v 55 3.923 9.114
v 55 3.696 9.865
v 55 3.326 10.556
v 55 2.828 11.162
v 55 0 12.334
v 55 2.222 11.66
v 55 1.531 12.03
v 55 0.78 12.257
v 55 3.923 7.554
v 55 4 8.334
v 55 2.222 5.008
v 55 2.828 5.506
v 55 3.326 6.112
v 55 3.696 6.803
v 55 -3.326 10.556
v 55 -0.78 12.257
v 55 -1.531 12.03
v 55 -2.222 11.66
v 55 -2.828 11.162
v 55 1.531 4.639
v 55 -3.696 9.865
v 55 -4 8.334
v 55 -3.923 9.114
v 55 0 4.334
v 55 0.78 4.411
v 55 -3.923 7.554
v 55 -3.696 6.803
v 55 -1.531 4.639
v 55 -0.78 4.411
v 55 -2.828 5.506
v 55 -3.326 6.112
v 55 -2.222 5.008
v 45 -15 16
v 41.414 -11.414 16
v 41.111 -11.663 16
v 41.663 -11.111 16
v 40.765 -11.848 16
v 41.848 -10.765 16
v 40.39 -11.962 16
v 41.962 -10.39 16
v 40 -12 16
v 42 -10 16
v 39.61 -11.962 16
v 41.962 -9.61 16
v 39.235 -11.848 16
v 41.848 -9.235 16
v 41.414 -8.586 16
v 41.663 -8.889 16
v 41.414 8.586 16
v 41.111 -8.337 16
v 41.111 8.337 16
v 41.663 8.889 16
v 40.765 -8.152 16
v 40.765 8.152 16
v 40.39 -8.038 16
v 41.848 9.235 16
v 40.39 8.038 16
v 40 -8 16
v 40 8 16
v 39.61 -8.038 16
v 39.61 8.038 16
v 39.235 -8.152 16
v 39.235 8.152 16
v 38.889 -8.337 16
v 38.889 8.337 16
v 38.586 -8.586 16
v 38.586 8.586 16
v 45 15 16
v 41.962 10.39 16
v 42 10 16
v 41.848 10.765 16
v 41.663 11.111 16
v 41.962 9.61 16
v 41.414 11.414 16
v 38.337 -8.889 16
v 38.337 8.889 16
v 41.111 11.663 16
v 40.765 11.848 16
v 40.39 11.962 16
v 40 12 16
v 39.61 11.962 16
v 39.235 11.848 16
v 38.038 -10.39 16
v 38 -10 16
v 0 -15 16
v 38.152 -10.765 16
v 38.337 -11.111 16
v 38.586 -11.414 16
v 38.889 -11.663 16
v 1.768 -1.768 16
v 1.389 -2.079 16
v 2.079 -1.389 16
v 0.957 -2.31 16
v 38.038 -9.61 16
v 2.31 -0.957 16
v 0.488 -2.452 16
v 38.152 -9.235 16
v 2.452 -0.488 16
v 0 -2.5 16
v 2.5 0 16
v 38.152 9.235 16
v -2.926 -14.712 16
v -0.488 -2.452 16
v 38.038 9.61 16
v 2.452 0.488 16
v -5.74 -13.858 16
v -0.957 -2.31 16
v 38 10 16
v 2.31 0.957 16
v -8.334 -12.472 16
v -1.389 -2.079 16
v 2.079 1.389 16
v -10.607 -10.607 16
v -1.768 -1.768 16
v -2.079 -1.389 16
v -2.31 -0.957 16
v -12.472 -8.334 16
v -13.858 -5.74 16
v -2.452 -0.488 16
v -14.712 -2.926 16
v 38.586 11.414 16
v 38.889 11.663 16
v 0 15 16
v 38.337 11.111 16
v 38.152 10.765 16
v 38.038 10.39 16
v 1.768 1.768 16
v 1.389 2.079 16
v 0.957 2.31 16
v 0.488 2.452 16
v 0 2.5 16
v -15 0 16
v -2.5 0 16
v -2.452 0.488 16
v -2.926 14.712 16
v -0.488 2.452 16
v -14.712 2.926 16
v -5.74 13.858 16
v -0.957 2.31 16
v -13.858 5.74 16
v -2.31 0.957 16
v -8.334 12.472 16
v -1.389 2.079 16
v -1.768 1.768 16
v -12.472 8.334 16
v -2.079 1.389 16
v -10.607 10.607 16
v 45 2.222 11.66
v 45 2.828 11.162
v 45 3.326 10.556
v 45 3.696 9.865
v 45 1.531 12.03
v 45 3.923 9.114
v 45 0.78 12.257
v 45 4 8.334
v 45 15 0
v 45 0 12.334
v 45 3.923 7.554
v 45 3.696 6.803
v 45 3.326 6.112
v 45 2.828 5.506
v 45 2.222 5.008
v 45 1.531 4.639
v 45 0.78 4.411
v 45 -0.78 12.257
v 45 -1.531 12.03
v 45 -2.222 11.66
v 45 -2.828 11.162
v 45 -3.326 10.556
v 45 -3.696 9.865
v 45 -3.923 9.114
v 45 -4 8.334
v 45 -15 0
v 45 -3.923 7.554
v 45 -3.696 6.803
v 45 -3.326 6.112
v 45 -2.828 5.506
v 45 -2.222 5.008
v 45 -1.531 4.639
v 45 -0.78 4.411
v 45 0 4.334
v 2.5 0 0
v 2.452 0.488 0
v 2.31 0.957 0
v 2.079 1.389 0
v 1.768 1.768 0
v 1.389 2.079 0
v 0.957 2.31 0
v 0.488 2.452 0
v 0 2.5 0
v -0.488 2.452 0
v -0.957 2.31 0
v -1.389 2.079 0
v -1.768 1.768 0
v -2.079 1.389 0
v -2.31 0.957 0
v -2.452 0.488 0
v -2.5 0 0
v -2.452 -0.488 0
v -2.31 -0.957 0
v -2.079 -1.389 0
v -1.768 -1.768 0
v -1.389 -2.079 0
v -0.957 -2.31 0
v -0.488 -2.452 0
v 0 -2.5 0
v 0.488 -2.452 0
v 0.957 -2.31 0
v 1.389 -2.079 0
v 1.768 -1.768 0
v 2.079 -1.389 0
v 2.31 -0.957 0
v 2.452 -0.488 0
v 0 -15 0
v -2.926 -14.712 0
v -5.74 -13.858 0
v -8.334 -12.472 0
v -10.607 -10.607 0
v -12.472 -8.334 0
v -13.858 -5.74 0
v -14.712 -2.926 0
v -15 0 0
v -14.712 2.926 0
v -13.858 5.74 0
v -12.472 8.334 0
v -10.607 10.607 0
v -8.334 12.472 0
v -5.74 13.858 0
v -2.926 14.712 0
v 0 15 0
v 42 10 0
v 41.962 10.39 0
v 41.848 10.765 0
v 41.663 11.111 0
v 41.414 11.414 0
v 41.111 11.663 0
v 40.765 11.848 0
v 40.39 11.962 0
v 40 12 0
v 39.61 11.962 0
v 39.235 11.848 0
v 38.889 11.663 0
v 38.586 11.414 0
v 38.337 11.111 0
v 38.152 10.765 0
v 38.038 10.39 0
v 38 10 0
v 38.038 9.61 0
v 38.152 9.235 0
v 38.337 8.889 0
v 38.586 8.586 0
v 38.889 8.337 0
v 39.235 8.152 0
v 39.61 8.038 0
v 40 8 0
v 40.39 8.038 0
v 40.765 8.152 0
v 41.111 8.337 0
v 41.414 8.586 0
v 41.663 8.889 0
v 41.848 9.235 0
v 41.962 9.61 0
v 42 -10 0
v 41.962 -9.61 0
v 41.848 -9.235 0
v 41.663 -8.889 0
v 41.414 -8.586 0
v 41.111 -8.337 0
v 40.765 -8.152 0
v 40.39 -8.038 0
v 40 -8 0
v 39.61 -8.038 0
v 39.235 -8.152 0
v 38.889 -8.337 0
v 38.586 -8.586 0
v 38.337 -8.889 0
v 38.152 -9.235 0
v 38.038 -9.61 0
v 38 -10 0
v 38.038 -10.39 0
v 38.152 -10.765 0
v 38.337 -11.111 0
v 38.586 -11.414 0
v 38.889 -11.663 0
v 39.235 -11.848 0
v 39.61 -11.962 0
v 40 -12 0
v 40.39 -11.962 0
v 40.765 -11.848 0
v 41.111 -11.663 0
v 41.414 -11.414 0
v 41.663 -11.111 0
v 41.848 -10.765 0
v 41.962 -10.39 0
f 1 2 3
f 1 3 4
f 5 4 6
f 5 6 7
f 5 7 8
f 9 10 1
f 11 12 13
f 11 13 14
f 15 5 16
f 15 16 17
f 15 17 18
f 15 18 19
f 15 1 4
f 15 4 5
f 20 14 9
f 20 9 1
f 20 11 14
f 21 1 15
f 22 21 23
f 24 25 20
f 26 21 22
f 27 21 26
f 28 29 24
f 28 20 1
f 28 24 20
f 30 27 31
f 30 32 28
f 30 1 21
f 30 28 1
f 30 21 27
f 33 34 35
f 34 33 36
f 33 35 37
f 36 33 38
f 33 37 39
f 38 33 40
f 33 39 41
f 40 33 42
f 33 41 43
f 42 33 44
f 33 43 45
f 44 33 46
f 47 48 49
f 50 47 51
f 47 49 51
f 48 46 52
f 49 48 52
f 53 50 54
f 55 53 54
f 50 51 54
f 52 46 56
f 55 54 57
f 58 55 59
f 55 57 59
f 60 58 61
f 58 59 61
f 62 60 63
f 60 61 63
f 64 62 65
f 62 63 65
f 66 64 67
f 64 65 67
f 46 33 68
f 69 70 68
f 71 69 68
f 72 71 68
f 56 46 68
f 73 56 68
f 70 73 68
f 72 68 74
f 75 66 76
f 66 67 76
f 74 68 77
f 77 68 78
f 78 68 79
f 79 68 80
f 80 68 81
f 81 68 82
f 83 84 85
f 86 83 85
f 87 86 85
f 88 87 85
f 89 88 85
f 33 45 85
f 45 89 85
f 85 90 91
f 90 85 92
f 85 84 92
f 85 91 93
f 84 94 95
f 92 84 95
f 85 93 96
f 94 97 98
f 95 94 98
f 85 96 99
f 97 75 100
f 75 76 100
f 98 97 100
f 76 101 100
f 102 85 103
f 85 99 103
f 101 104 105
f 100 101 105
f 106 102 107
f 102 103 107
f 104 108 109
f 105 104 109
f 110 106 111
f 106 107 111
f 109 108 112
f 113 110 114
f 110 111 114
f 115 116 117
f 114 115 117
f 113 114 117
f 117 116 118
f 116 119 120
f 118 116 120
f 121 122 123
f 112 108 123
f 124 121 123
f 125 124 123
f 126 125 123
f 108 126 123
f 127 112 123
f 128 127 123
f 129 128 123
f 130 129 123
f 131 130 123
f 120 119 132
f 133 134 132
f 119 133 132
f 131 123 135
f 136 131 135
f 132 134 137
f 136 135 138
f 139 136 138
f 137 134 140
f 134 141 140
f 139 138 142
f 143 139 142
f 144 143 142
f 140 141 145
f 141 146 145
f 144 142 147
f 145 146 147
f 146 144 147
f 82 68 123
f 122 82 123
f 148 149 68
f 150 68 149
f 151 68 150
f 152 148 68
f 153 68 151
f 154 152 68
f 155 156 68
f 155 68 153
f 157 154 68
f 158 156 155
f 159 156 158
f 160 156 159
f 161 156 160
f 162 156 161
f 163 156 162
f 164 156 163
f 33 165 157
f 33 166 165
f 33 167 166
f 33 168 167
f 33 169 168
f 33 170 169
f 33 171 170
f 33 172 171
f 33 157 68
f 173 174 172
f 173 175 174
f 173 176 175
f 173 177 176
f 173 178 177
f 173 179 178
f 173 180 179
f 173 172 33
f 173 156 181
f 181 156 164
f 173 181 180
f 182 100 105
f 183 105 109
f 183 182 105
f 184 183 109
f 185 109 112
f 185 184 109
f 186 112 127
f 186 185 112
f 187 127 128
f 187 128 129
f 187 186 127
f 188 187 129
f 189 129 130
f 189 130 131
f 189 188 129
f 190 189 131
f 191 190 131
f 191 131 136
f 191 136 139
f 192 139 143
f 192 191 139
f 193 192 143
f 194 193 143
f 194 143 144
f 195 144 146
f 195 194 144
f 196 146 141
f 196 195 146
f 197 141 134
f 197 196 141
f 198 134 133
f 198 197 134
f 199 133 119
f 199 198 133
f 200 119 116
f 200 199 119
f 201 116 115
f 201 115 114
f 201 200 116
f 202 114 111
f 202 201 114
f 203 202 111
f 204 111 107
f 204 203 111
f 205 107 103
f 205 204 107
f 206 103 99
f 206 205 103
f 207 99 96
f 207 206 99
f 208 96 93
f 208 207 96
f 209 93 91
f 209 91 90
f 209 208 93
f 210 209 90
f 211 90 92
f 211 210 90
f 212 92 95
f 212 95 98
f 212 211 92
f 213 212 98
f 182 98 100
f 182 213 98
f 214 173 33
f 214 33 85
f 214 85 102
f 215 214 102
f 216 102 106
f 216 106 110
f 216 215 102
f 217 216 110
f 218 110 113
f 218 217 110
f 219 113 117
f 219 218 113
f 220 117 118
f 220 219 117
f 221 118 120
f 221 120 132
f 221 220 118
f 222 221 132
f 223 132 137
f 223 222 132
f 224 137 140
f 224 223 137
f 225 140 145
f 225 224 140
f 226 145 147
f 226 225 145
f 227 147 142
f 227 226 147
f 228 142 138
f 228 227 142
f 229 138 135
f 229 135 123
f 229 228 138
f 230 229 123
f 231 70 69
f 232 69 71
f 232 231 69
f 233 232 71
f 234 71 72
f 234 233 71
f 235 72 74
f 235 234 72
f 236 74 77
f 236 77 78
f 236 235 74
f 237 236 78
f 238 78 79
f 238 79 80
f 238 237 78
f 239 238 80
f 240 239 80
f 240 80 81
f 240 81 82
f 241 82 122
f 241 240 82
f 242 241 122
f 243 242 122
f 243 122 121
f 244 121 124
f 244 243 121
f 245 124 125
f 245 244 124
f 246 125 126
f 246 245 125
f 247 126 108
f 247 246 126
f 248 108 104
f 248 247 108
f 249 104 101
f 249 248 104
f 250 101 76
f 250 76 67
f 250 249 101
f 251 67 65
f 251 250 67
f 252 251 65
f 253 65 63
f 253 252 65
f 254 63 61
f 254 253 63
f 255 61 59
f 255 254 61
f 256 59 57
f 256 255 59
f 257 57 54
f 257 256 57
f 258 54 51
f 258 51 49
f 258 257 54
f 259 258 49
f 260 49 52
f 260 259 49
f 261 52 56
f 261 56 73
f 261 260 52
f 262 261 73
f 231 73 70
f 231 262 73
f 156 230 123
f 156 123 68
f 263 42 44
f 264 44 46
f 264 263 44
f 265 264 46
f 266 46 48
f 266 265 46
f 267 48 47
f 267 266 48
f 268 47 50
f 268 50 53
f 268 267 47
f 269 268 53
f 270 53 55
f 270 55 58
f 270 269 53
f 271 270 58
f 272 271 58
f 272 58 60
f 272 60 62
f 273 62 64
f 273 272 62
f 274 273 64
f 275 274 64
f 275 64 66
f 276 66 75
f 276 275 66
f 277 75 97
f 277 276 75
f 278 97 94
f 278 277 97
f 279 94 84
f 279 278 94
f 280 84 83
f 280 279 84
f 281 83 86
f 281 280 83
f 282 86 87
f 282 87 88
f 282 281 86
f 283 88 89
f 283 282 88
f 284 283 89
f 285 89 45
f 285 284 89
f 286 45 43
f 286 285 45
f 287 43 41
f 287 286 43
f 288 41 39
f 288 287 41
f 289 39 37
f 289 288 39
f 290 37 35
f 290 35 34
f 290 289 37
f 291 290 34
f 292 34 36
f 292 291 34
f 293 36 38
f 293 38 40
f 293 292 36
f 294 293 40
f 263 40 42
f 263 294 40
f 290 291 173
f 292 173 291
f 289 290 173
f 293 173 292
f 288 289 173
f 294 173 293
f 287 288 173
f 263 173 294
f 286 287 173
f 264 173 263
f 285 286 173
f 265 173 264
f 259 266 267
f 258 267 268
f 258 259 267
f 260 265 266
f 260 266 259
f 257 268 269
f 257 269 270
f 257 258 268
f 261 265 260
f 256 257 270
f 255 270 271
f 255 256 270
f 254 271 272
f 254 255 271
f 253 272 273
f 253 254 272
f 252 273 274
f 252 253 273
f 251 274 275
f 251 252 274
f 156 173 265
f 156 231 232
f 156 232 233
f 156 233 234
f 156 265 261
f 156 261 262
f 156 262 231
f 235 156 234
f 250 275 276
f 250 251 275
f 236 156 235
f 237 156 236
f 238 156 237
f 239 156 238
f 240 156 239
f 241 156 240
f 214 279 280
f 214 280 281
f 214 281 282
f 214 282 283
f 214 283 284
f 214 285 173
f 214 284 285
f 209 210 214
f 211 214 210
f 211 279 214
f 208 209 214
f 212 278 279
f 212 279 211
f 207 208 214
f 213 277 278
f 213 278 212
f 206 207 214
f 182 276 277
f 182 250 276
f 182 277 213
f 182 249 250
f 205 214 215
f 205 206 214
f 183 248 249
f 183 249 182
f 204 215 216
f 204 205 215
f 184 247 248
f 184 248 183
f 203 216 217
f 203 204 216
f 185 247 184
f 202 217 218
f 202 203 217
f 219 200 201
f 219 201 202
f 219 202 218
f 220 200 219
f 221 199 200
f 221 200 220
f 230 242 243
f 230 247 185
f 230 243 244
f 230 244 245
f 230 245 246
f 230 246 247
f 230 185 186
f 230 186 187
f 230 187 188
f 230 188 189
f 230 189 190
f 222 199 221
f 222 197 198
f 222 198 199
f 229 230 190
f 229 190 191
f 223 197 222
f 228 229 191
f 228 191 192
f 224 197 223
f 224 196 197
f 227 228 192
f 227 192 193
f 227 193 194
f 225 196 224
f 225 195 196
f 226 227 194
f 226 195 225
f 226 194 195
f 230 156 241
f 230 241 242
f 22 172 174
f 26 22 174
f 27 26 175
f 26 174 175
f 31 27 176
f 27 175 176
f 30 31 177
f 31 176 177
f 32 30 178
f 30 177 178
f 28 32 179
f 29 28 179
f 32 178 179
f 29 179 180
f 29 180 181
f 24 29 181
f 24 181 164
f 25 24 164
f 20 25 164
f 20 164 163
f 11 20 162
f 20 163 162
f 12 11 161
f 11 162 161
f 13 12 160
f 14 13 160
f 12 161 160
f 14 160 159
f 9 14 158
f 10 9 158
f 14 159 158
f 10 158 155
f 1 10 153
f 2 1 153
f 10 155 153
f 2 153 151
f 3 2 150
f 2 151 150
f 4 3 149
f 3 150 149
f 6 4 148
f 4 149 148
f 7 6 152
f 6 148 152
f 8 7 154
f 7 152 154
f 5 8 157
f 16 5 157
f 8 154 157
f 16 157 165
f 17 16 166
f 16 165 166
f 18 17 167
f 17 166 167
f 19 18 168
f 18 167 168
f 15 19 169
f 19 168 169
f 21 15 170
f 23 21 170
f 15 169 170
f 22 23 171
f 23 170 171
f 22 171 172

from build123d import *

# Parameters (mm, degrees)
SKETCH1_R           = 2
SKETCH1_R_2         = 2.5
BOSS_EXTRUDE1_DEPTH = 16
SKETCH2_R           = 4
BOSS_EXTRUDE2_DEPTH = 10


with BuildPart() as part:
    # Sketch1 → Boss-Extrude1 (new body)
    with BuildSketch(Plane.XY):
        with BuildLine():
            Line((0, 15), (45, 15))
            Line((45, 15), (45, -15))
            Line((45, -15), (0, -15))
            ThreePointArc((0, -15), (-15, 0), (0, 15))
        make_face()
        with Locations((40, 10)):
            Circle(SKETCH1_R, mode=Mode.SUBTRACT)
        with Locations((40, -10)):
            Circle(SKETCH1_R, mode=Mode.SUBTRACT)
        Circle(SKETCH1_R_2, mode=Mode.SUBTRACT)
    extrude(amount=BOSS_EXTRUDE1_DEPTH)

    # Sketch2 → Boss-Extrude2 (add)
    with BuildSketch(Plane(origin=(45, 0, 0), x_dir=(0, 0, -1), z_dir=(1, 0, 0))):
        with Locations(Location((-8.334071627, 0, 0), (0, 0, 270))):
            Circle(SKETCH2_R)
    extrude(amount=BOSS_EXTRUDE2_DEPTH)


solid = part.part
